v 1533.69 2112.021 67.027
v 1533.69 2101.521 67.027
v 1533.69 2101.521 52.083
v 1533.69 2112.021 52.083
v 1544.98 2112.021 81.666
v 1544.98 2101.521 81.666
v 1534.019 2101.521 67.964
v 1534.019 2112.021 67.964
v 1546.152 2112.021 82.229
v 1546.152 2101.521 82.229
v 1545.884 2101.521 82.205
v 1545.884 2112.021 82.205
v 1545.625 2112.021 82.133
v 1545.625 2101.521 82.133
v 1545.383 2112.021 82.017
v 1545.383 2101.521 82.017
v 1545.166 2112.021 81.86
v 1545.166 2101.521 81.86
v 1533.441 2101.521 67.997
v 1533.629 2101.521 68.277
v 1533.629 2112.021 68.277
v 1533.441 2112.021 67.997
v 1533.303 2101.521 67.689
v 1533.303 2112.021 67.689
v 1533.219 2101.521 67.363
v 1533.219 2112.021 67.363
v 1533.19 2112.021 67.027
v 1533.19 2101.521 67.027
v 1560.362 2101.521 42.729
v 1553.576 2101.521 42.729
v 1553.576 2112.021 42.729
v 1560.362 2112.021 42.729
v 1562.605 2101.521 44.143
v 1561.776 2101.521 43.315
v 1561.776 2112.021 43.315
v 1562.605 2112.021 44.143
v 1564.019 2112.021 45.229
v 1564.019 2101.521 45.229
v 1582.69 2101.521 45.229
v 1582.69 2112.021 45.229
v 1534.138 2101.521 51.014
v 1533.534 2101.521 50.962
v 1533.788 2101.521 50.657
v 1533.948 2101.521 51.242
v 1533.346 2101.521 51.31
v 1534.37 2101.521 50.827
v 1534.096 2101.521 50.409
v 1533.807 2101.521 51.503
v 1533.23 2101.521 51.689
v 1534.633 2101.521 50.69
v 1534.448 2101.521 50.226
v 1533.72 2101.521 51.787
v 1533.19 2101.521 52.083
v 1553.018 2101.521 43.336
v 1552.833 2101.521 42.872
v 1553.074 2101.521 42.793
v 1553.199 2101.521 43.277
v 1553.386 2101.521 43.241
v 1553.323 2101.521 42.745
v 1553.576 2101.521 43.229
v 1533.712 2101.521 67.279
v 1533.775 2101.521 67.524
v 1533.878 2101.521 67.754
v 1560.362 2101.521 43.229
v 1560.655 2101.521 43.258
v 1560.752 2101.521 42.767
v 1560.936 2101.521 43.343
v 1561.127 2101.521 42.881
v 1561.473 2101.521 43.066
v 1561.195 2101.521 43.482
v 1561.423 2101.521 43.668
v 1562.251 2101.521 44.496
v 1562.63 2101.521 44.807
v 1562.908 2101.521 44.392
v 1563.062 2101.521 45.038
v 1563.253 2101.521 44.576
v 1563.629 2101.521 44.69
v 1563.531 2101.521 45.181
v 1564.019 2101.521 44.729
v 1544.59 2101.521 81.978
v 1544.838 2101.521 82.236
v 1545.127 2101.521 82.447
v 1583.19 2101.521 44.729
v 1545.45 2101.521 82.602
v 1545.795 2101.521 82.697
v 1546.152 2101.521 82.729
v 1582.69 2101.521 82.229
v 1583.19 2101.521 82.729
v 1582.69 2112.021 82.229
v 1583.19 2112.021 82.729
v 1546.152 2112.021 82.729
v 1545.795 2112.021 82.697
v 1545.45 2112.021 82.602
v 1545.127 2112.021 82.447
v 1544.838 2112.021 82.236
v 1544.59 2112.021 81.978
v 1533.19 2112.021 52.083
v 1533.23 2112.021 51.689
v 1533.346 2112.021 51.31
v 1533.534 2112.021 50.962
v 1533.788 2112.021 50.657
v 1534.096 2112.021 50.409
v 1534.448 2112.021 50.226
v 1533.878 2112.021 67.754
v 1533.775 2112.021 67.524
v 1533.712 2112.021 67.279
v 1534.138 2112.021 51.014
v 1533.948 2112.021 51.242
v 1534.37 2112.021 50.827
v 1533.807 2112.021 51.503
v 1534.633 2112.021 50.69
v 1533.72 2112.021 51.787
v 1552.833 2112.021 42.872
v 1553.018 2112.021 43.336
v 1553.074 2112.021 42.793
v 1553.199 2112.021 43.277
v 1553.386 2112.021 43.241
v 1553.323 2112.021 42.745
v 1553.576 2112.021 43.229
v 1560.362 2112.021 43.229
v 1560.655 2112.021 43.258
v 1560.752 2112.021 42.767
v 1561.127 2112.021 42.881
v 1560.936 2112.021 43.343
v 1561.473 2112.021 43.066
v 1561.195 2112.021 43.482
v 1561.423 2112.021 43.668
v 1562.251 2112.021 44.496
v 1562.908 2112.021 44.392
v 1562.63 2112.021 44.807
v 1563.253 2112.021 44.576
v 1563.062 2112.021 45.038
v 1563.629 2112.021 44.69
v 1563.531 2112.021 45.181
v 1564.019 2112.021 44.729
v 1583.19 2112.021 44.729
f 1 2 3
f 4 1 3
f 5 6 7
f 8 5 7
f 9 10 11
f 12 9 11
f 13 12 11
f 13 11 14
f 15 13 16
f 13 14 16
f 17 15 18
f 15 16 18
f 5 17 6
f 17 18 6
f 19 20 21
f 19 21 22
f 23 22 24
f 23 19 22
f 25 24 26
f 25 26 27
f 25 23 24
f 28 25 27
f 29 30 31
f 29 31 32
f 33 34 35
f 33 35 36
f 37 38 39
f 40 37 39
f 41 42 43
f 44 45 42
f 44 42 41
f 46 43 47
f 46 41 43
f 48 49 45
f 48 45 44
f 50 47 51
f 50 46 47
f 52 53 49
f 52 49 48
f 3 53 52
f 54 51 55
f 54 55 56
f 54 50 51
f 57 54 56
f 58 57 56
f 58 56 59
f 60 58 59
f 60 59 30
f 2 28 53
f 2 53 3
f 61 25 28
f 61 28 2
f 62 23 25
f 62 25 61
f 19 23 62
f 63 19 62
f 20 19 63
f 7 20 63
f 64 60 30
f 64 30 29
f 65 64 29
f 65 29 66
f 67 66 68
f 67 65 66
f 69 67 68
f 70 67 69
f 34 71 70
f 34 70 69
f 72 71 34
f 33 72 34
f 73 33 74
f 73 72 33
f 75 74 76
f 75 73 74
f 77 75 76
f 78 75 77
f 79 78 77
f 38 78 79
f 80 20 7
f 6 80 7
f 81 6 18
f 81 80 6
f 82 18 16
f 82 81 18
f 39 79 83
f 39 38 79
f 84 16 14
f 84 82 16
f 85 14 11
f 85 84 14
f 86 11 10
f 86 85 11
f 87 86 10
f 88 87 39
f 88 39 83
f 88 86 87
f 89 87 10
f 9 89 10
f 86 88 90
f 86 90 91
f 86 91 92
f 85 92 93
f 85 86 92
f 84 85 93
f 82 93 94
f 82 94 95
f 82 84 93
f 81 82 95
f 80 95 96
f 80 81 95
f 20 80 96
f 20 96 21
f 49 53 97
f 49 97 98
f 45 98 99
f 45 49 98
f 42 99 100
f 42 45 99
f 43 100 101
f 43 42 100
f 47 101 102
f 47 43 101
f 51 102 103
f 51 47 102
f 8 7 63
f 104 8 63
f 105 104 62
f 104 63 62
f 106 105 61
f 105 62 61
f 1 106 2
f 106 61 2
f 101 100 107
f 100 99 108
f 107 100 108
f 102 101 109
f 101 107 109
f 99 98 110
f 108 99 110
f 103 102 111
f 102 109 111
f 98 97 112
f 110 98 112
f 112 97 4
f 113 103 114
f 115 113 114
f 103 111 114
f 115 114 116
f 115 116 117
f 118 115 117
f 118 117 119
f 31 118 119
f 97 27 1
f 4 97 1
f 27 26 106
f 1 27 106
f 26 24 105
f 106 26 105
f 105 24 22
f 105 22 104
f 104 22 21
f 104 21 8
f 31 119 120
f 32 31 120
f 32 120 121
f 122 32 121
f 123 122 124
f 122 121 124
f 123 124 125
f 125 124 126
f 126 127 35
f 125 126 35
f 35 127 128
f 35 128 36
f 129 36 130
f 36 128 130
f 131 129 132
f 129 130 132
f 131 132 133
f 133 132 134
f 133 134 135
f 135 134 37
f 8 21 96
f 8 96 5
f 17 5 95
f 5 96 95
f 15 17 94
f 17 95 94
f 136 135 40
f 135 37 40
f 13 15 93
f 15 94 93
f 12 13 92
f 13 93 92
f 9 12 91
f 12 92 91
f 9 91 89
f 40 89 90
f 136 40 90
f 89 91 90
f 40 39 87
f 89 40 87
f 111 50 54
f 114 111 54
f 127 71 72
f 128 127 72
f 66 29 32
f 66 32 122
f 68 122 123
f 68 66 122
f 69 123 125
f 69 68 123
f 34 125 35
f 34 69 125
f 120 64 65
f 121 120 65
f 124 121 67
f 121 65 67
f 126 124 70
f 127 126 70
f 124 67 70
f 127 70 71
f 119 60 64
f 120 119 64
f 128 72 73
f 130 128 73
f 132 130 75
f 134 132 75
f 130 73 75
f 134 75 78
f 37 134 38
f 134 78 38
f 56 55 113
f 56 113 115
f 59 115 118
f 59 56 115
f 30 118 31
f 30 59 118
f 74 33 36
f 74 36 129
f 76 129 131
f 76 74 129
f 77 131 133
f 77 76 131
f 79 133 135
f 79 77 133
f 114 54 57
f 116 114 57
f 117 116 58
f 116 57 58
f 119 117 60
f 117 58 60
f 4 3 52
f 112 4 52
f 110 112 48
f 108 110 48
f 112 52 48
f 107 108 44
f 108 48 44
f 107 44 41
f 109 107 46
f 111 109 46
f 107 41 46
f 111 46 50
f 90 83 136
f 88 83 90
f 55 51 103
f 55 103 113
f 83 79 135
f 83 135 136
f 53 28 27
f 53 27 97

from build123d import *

# Parameters (mm, degrees)
RESSALTO_EXTRUS_O3_DEPTH = 10.5


with BuildPart() as part:
    # Esboço2 → Ressalto-extrusão3 (new body)
    with BuildSketch(Plane.XZ.offset(-2101.521299532)):
        with BuildLine():
            Line((1583.190356412, 82.728727741), (1546.151606107, 82.728727741))
            ThreePointArc((1546.151606107, 82.728727741), (1545.285228646, 82.531334214), (1544.589868488, 81.978117836))
            Line((1544.589868488, 81.978117836), (1533.628618793, 68.276555718))
            ThreePointArc((1533.628618793, 68.276555718), (1533.303099773, 67.689179505), (1533.190356412, 67.027165622))
            Line((1533.190356412, 67.027165622), (1533.190356412, 52.082793664))
            ThreePointArc((1533.190356412, 52.082793664), (1533.534221951, 50.961536045), (1534.447575059, 50.225840282))
            Line((1534.447575059, 50.225840282), (1552.832739866, 42.871774359))
            ThreePointArc((1552.832739866, 42.871774359), (1553.197306177, 42.764814968), (1553.575521219, 42.728727741))
            Line((1553.575521219, 42.728727741), (1560.361929287, 42.728727741))
            ThreePointArc((1560.361929287, 42.728727741), (1561.127296152, 42.880968676), (1561.776142849, 43.314514179))
            Line((1561.776142849, 43.314514179), (1562.604569974, 44.142941304))
            ThreePointArc((1562.604569974, 44.142941304), (1563.253416672, 44.576486806), (1564.018783537, 44.728727741))
            Line((1564.018783537, 44.728727741), (1583.190356412, 44.728727741))
            Line((1583.190356412, 44.728727741), (1583.190356412, 82.728727741))
        make_face()
        with BuildLine():
            Line((1564.018783537, 45.228727741), (1582.690356412, 45.228727741))
            Line((1582.690356412, 45.228727741), (1582.690356412, 82.228727741))
            Line((1582.690356412, 82.228727741), (1546.151606107, 82.228727741))
            ThreePointArc((1546.151606107, 82.228727741), (1545.501823011, 82.080682596), (1544.980302893, 81.665770313))
            Line((1544.980302893, 81.665770313), (1534.019053198, 67.964208194))
            ThreePointArc((1534.019053198, 67.964208194), (1533.774913933, 67.523676035), (1533.690356412, 67.027165622))
            Line((1533.690356412, 67.027165622), (1533.690356412, 52.082793664))
            ThreePointArc((1533.690356412, 52.082793664), (1533.948255566, 51.24185045), (1534.633270397, 50.690078628))
            Line((1534.633270397, 50.690078628), (1553.018435204, 43.336012705))
            ThreePointArc((1553.018435204, 43.336012705), (1553.291859937, 43.255793161), (1553.575521219, 43.228727741))
            Line((1553.575521219, 43.228727741), (1560.361929287, 43.228727741))
            ThreePointArc((1560.361929287, 43.228727741), (1560.935954436, 43.342908442), (1561.422589459, 43.668067569))
            Line((1561.422589459, 43.668067569), (1562.251016584, 44.496494694))
            ThreePointArc((1562.251016584, 44.496494694), (1563.062074956, 45.038426572), (1564.018783537, 45.228727741))
        make_face(mode=Mode.SUBTRACT)
    extrude(amount=-RESSALTO_EXTRUS_O3_DEPTH)


solid = part.part
